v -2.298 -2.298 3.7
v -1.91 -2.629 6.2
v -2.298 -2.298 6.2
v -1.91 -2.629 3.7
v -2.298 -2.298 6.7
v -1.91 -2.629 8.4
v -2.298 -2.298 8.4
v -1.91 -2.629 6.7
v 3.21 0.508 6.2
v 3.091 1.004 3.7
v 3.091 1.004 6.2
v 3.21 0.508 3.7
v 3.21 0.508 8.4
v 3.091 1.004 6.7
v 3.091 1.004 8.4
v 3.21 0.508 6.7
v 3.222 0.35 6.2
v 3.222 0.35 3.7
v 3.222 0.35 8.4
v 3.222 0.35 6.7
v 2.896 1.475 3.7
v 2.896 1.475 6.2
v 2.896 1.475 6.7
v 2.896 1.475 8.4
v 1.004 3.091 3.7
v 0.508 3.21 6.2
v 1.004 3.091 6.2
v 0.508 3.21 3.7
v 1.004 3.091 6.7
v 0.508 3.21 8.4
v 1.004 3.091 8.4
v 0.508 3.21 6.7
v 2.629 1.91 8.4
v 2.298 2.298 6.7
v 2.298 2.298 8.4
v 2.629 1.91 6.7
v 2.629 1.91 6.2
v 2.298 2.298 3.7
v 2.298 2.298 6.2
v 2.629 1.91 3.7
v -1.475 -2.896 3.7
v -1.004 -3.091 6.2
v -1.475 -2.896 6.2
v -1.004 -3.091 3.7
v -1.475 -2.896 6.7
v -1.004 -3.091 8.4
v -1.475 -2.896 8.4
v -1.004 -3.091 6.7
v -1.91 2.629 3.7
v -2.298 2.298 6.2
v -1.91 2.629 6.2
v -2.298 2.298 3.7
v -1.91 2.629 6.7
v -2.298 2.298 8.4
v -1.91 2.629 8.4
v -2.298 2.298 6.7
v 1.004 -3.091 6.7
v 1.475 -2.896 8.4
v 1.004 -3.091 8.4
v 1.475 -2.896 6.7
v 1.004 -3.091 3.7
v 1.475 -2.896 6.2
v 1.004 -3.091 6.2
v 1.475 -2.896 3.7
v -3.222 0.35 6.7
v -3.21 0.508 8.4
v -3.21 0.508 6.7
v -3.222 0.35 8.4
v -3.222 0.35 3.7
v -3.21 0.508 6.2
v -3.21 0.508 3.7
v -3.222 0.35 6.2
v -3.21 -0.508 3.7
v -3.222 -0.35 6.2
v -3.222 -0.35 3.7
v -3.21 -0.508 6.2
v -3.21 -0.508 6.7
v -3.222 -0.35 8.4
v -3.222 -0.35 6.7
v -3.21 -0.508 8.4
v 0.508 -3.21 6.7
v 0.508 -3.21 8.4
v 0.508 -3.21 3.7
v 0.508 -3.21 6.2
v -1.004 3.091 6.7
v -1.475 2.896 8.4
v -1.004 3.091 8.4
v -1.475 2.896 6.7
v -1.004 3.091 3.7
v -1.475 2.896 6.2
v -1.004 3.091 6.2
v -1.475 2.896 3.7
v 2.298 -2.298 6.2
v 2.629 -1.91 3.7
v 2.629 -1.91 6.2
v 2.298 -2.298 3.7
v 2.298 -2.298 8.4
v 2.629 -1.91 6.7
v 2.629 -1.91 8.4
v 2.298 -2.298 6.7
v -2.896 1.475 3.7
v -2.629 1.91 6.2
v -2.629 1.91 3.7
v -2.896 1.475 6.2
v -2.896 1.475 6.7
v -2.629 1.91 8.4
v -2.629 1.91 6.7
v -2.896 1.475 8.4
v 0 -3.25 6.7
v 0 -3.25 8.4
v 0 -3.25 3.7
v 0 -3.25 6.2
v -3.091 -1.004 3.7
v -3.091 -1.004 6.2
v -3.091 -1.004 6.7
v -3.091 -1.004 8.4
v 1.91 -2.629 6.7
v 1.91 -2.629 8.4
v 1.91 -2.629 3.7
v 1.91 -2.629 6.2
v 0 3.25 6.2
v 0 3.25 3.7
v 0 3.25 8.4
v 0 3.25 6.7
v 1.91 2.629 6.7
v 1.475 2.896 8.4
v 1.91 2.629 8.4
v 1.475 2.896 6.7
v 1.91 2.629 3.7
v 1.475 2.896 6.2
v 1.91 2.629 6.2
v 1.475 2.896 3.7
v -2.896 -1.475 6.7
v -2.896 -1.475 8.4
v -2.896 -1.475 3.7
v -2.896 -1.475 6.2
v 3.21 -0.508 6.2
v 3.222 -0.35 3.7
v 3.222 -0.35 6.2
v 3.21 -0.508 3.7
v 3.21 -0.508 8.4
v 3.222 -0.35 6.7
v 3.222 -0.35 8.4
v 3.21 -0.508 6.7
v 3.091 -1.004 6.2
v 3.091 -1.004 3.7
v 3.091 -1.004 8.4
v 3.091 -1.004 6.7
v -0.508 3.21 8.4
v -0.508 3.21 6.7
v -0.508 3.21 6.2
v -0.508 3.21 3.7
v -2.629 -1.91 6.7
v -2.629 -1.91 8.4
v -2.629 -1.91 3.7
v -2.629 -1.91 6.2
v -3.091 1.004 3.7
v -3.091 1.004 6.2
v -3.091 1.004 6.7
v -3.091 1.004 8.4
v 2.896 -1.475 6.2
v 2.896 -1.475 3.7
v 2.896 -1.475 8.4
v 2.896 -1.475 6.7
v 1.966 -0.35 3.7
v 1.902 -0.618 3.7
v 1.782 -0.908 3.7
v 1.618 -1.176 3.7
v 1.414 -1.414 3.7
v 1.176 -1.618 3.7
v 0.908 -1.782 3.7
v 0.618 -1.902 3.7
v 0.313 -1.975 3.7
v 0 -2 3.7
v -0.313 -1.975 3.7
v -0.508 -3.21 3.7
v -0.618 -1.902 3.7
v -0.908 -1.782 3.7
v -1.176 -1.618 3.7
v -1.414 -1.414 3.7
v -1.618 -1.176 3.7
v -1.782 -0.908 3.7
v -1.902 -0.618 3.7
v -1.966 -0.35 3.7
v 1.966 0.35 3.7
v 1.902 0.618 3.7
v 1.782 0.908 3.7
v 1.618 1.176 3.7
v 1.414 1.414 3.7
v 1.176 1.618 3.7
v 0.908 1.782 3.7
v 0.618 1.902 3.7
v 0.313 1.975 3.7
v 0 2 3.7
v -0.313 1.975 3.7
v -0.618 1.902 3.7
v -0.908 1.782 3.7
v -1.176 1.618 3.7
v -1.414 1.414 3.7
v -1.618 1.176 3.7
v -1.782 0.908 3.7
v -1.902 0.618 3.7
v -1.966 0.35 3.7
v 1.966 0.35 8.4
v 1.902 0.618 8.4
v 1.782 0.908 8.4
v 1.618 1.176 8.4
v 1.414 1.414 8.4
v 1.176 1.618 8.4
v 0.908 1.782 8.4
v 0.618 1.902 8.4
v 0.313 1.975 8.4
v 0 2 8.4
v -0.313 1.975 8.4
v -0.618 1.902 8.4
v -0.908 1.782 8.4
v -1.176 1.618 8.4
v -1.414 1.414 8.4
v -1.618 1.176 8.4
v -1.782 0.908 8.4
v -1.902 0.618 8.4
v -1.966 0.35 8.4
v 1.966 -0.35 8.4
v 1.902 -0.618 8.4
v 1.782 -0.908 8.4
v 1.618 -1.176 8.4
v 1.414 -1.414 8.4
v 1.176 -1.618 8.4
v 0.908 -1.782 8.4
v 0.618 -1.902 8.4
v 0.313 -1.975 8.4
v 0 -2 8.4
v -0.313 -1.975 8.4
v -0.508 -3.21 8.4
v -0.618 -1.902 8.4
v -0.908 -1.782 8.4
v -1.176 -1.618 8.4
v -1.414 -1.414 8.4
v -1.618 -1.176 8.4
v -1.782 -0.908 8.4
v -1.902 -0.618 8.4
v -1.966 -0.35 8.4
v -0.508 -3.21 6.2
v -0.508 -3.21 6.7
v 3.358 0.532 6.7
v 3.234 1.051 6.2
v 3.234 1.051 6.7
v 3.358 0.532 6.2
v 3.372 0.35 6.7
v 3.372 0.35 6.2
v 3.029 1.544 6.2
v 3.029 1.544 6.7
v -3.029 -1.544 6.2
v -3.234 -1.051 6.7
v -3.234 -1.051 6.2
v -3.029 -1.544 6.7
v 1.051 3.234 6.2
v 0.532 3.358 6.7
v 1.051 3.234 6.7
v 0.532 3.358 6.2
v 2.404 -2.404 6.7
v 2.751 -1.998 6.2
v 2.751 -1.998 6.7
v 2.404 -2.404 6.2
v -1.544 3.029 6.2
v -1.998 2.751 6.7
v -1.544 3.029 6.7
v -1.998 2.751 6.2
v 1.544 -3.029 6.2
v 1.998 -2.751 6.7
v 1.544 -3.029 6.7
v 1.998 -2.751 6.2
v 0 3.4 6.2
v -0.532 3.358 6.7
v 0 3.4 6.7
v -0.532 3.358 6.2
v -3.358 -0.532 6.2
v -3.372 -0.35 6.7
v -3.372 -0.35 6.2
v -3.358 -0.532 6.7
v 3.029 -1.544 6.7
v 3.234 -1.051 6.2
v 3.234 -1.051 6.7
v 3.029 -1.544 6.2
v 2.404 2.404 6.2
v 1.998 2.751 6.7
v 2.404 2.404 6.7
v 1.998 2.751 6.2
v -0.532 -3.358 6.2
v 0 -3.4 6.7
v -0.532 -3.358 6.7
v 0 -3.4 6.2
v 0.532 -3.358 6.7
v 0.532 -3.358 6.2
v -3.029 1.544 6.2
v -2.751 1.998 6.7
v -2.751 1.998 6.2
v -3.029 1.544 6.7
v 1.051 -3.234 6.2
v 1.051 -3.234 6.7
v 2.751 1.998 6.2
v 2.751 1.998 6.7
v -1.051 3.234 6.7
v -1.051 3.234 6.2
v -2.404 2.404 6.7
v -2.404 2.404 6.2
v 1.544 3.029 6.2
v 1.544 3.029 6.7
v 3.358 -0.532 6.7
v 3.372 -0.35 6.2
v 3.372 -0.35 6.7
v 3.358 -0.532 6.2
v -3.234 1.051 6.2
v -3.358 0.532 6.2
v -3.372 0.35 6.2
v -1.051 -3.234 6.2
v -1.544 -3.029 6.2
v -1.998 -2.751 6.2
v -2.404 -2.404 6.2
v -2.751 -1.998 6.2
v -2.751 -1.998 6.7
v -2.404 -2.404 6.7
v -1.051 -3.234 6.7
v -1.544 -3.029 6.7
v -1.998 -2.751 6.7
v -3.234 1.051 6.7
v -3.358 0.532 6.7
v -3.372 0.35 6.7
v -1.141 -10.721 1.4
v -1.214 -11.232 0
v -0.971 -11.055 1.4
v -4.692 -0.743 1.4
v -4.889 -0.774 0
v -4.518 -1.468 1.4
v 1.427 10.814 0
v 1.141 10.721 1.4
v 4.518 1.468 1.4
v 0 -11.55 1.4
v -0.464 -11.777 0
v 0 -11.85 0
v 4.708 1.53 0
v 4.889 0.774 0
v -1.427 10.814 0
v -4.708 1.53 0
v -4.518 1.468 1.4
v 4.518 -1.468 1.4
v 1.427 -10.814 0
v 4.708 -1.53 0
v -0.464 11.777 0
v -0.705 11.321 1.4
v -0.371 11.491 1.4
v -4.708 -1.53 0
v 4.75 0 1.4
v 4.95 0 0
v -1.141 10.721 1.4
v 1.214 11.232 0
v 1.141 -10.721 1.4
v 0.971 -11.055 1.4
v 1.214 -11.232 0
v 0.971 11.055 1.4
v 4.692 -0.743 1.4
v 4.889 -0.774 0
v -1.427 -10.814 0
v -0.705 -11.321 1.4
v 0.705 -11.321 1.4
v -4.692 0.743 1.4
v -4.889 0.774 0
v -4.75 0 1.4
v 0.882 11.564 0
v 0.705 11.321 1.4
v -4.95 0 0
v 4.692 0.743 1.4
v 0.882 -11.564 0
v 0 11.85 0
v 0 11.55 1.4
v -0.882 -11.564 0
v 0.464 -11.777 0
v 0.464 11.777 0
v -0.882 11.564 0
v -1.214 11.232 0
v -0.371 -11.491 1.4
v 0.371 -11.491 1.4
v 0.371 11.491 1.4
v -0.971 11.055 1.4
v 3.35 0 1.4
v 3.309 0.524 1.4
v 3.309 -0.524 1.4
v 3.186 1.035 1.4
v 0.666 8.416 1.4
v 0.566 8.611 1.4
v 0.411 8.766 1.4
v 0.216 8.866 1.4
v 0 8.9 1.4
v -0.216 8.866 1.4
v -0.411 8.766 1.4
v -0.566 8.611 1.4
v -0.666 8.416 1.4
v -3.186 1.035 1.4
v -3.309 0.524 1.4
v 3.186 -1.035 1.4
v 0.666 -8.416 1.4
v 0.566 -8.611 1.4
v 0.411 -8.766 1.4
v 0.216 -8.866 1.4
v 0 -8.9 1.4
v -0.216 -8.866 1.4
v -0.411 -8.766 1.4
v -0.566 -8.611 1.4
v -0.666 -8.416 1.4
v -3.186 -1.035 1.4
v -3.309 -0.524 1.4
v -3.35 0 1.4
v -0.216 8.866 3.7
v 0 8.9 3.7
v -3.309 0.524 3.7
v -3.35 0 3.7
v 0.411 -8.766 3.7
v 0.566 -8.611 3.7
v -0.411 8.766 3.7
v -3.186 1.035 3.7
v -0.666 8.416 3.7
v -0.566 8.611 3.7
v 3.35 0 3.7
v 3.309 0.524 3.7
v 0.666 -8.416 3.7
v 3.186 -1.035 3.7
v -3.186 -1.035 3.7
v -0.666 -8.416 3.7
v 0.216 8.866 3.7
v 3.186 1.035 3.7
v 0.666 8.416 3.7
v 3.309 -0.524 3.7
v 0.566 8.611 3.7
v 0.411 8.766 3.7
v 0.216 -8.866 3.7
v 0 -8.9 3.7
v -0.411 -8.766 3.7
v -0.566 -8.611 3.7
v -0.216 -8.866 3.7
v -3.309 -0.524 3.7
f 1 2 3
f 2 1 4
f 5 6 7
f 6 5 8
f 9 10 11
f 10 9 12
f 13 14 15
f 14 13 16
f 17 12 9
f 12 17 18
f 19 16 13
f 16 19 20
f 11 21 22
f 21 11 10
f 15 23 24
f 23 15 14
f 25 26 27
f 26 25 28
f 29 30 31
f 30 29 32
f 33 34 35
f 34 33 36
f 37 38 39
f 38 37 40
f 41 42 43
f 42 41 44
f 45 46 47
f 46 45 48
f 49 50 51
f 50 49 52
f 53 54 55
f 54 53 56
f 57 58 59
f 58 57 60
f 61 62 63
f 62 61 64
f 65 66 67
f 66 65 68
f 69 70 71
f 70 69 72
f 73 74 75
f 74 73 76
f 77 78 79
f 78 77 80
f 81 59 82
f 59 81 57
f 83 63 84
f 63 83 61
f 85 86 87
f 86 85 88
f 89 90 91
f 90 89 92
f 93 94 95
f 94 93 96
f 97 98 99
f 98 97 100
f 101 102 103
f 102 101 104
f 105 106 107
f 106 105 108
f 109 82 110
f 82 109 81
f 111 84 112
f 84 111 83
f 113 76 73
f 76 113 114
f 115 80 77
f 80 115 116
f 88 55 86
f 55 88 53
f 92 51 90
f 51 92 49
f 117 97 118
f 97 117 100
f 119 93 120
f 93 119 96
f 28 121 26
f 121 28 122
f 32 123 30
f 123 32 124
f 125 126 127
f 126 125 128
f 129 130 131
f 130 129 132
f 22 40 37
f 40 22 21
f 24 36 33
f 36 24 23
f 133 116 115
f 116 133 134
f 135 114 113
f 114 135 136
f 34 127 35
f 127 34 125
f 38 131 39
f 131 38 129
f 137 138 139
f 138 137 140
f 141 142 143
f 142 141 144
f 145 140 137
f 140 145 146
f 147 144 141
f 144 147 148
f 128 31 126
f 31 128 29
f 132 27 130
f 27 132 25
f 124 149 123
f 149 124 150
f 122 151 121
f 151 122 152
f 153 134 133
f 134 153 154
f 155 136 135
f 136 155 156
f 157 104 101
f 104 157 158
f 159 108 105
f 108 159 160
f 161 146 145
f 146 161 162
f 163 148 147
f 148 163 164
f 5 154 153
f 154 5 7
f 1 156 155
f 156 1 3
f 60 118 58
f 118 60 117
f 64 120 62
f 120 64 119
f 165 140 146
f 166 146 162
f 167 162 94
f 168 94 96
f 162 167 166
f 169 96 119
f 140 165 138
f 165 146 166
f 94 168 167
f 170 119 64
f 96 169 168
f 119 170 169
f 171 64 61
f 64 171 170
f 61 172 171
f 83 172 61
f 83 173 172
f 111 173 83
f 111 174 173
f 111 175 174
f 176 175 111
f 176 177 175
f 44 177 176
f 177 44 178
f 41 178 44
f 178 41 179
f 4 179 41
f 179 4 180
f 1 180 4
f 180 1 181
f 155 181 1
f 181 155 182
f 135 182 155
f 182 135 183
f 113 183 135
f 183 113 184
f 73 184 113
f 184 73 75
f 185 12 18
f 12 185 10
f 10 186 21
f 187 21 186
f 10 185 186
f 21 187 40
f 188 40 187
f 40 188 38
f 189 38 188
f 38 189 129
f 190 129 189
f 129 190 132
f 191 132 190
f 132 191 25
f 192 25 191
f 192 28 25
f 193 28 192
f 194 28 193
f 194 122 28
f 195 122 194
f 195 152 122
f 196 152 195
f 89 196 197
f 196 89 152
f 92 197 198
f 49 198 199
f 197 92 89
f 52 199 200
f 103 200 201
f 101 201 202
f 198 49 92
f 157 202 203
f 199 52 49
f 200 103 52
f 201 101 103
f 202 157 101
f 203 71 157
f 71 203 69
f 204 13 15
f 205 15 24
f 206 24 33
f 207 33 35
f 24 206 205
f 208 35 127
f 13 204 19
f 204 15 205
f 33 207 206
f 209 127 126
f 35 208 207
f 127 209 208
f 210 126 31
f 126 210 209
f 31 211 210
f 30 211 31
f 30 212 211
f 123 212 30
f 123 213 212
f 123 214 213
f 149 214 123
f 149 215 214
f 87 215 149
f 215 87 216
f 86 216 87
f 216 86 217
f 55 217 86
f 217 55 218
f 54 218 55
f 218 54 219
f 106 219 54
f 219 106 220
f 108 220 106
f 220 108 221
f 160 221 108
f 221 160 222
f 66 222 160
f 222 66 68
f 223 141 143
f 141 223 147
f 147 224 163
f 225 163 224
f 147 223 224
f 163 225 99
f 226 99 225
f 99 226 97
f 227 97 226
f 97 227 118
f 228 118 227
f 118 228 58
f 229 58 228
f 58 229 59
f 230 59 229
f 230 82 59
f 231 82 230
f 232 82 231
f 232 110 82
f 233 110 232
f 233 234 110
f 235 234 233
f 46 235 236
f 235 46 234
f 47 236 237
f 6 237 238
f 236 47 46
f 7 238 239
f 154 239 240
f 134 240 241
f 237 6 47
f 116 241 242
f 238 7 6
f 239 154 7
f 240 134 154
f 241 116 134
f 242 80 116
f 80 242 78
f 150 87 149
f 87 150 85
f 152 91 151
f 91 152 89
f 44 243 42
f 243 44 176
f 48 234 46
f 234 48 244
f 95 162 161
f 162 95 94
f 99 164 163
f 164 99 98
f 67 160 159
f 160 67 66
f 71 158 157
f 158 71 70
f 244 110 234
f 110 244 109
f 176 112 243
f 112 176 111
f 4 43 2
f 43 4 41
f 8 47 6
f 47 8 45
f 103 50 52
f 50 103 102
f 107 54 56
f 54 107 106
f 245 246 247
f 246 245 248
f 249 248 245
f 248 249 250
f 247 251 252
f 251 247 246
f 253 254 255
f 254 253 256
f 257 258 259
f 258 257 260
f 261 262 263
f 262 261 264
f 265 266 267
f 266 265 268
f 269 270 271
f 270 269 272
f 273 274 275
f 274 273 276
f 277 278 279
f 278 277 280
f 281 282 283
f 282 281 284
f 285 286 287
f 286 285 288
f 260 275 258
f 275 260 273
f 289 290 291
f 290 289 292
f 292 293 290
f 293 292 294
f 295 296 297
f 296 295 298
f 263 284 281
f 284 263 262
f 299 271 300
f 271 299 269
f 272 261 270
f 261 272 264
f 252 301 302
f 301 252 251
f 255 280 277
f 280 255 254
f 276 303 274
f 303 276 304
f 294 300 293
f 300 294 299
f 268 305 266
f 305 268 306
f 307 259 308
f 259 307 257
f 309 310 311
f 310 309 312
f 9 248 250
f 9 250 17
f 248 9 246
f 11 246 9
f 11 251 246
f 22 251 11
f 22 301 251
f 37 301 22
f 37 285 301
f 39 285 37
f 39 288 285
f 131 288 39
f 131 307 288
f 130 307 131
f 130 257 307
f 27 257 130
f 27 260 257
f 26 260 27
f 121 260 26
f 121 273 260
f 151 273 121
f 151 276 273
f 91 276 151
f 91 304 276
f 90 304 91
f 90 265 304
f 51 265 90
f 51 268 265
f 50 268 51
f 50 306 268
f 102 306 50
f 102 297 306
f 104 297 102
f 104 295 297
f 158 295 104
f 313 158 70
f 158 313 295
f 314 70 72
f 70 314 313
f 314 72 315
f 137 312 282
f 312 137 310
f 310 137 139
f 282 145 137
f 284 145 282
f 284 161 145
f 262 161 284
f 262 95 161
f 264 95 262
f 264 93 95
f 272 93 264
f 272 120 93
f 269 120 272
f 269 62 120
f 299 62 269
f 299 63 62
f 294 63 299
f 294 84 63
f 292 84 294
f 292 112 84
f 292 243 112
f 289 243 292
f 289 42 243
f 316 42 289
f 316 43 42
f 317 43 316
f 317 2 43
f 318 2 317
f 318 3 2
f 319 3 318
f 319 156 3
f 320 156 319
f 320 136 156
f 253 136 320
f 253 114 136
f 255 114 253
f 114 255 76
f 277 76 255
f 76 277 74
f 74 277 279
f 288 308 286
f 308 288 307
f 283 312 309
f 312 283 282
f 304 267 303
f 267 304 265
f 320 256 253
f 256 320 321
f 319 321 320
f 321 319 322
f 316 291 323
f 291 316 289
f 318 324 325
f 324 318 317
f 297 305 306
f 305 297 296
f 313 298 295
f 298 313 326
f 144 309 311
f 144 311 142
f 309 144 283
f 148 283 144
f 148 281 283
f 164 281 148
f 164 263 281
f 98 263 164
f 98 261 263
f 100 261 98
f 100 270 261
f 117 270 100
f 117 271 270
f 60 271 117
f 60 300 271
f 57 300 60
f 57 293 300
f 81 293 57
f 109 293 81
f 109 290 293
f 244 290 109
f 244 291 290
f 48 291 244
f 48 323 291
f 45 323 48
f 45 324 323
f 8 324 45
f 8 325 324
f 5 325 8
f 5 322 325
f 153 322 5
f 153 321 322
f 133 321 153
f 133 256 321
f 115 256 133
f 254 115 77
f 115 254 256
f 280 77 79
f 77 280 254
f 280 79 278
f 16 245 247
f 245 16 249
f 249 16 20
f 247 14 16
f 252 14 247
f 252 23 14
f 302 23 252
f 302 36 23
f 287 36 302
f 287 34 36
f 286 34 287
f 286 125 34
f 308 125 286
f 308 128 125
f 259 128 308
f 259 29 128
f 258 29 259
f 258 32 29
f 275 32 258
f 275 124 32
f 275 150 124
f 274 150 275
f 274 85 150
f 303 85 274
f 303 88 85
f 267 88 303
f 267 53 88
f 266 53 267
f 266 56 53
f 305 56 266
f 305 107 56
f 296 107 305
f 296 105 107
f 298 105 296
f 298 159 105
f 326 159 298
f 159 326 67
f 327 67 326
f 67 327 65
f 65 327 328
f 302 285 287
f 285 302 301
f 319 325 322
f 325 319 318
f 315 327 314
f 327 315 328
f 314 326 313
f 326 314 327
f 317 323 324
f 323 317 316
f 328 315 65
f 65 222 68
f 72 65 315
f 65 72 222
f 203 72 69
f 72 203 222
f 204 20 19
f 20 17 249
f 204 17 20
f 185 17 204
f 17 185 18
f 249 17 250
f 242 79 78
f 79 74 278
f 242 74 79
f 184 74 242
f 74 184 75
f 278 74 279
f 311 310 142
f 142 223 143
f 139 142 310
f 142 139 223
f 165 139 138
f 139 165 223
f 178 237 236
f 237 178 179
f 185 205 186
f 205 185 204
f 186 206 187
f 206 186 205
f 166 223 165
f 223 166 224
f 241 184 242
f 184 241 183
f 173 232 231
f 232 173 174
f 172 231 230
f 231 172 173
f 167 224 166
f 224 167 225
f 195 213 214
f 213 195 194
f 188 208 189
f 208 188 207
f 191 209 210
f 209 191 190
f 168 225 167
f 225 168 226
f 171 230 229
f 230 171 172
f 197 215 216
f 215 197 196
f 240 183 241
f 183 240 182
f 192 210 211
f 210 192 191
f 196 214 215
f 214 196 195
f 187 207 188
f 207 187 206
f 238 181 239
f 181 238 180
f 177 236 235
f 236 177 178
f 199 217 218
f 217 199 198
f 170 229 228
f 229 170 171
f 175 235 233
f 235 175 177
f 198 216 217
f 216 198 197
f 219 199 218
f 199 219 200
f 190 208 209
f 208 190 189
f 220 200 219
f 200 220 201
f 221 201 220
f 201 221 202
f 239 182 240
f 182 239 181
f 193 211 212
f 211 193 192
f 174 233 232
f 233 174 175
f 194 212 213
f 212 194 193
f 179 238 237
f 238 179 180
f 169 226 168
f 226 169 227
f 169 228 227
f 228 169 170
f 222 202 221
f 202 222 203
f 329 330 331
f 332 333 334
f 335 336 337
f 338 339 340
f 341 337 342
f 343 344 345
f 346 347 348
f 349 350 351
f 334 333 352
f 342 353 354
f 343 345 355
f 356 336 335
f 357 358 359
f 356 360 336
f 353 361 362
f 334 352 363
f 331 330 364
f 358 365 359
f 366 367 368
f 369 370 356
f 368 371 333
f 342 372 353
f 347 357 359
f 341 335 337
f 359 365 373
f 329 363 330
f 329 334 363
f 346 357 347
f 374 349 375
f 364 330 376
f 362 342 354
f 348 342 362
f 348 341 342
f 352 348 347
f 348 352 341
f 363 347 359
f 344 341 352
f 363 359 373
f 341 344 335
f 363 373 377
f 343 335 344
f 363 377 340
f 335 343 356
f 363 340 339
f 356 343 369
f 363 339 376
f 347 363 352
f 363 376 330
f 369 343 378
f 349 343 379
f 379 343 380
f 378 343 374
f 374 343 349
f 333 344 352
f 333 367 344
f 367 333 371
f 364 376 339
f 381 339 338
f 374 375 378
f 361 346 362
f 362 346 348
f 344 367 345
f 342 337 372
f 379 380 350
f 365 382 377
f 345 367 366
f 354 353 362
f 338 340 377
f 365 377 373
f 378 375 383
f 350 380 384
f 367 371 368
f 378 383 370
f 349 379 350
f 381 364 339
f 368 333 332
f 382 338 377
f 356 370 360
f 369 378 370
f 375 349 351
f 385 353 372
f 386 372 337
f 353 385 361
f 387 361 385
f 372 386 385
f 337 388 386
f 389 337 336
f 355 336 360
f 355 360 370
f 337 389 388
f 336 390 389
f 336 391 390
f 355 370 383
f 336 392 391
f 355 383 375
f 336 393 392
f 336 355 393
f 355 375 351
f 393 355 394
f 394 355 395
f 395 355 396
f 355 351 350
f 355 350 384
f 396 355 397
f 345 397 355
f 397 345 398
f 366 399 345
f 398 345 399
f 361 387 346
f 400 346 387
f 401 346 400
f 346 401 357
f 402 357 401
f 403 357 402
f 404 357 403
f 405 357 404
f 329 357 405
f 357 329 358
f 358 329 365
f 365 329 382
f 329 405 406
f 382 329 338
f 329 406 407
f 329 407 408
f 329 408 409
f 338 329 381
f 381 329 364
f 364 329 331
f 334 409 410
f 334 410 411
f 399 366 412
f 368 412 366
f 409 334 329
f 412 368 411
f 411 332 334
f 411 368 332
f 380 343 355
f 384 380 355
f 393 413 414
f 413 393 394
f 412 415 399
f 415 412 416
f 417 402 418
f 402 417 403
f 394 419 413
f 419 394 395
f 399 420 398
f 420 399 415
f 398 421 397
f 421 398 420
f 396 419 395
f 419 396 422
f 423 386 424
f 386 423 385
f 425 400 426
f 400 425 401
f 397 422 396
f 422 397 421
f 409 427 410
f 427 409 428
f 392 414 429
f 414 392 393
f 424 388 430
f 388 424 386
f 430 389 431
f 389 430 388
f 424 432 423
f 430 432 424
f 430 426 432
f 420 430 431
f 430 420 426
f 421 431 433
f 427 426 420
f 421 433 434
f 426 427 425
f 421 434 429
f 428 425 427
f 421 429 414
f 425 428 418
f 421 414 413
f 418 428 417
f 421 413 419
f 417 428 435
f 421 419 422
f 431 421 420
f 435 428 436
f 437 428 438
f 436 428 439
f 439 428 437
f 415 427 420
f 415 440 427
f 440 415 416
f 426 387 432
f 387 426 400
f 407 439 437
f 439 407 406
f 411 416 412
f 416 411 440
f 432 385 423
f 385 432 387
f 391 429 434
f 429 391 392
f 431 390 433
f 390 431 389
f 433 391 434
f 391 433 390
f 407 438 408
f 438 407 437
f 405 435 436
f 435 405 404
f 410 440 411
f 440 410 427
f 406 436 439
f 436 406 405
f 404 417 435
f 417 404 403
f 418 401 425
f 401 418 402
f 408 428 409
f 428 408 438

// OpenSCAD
R1=1.5;
R2=1.2;

RR1=0.7;
RR2=0.7;


hull() {
    cylinder(h=1.4, r1=9.9/2, r2=9.5/2, $fn=40);
    translate([0, -(23.7/2-R1), 0])
      cylinder(h=1.4, r1=R1, r2=R2, $fn=20);
    translate([0, +(23.7/2-R1), 0])
      cylinder(h=1.4, r1=R1, r2=R2, $fn=20);
}    

translate([0, 0, 1.4])
    hull() {
        cylinder(h=2.3, r1=6.7/2, r2=6.7/2, $fn=40);
        translate([0, -(17.8/2-RR1), 0])
          cylinder(h=2.3, r1=RR1, r2=RR2, $fn=20);
        translate([0, +(17.8/2-RR1), 0])
          cylinder(h=2.3, r1=RR1, r2=RR2, $fn=20);
    }    


    
translate([0, 0, 3.7]) {
 difference() {
  union() {   
    cylinder(h=4.7, r1=6.5/2, r2=6.5/2, $fn=40);
    translate([0, 0, 2.5])
      cylinder(h=0.5, r1=6.8/2, r2=6.8/2, $fn=40);
  }
  cube([10, 0.7, 10], center=true);
  cylinder(h=5, r1=4/2, r2=4/2, $fn=40);  
  }
}
